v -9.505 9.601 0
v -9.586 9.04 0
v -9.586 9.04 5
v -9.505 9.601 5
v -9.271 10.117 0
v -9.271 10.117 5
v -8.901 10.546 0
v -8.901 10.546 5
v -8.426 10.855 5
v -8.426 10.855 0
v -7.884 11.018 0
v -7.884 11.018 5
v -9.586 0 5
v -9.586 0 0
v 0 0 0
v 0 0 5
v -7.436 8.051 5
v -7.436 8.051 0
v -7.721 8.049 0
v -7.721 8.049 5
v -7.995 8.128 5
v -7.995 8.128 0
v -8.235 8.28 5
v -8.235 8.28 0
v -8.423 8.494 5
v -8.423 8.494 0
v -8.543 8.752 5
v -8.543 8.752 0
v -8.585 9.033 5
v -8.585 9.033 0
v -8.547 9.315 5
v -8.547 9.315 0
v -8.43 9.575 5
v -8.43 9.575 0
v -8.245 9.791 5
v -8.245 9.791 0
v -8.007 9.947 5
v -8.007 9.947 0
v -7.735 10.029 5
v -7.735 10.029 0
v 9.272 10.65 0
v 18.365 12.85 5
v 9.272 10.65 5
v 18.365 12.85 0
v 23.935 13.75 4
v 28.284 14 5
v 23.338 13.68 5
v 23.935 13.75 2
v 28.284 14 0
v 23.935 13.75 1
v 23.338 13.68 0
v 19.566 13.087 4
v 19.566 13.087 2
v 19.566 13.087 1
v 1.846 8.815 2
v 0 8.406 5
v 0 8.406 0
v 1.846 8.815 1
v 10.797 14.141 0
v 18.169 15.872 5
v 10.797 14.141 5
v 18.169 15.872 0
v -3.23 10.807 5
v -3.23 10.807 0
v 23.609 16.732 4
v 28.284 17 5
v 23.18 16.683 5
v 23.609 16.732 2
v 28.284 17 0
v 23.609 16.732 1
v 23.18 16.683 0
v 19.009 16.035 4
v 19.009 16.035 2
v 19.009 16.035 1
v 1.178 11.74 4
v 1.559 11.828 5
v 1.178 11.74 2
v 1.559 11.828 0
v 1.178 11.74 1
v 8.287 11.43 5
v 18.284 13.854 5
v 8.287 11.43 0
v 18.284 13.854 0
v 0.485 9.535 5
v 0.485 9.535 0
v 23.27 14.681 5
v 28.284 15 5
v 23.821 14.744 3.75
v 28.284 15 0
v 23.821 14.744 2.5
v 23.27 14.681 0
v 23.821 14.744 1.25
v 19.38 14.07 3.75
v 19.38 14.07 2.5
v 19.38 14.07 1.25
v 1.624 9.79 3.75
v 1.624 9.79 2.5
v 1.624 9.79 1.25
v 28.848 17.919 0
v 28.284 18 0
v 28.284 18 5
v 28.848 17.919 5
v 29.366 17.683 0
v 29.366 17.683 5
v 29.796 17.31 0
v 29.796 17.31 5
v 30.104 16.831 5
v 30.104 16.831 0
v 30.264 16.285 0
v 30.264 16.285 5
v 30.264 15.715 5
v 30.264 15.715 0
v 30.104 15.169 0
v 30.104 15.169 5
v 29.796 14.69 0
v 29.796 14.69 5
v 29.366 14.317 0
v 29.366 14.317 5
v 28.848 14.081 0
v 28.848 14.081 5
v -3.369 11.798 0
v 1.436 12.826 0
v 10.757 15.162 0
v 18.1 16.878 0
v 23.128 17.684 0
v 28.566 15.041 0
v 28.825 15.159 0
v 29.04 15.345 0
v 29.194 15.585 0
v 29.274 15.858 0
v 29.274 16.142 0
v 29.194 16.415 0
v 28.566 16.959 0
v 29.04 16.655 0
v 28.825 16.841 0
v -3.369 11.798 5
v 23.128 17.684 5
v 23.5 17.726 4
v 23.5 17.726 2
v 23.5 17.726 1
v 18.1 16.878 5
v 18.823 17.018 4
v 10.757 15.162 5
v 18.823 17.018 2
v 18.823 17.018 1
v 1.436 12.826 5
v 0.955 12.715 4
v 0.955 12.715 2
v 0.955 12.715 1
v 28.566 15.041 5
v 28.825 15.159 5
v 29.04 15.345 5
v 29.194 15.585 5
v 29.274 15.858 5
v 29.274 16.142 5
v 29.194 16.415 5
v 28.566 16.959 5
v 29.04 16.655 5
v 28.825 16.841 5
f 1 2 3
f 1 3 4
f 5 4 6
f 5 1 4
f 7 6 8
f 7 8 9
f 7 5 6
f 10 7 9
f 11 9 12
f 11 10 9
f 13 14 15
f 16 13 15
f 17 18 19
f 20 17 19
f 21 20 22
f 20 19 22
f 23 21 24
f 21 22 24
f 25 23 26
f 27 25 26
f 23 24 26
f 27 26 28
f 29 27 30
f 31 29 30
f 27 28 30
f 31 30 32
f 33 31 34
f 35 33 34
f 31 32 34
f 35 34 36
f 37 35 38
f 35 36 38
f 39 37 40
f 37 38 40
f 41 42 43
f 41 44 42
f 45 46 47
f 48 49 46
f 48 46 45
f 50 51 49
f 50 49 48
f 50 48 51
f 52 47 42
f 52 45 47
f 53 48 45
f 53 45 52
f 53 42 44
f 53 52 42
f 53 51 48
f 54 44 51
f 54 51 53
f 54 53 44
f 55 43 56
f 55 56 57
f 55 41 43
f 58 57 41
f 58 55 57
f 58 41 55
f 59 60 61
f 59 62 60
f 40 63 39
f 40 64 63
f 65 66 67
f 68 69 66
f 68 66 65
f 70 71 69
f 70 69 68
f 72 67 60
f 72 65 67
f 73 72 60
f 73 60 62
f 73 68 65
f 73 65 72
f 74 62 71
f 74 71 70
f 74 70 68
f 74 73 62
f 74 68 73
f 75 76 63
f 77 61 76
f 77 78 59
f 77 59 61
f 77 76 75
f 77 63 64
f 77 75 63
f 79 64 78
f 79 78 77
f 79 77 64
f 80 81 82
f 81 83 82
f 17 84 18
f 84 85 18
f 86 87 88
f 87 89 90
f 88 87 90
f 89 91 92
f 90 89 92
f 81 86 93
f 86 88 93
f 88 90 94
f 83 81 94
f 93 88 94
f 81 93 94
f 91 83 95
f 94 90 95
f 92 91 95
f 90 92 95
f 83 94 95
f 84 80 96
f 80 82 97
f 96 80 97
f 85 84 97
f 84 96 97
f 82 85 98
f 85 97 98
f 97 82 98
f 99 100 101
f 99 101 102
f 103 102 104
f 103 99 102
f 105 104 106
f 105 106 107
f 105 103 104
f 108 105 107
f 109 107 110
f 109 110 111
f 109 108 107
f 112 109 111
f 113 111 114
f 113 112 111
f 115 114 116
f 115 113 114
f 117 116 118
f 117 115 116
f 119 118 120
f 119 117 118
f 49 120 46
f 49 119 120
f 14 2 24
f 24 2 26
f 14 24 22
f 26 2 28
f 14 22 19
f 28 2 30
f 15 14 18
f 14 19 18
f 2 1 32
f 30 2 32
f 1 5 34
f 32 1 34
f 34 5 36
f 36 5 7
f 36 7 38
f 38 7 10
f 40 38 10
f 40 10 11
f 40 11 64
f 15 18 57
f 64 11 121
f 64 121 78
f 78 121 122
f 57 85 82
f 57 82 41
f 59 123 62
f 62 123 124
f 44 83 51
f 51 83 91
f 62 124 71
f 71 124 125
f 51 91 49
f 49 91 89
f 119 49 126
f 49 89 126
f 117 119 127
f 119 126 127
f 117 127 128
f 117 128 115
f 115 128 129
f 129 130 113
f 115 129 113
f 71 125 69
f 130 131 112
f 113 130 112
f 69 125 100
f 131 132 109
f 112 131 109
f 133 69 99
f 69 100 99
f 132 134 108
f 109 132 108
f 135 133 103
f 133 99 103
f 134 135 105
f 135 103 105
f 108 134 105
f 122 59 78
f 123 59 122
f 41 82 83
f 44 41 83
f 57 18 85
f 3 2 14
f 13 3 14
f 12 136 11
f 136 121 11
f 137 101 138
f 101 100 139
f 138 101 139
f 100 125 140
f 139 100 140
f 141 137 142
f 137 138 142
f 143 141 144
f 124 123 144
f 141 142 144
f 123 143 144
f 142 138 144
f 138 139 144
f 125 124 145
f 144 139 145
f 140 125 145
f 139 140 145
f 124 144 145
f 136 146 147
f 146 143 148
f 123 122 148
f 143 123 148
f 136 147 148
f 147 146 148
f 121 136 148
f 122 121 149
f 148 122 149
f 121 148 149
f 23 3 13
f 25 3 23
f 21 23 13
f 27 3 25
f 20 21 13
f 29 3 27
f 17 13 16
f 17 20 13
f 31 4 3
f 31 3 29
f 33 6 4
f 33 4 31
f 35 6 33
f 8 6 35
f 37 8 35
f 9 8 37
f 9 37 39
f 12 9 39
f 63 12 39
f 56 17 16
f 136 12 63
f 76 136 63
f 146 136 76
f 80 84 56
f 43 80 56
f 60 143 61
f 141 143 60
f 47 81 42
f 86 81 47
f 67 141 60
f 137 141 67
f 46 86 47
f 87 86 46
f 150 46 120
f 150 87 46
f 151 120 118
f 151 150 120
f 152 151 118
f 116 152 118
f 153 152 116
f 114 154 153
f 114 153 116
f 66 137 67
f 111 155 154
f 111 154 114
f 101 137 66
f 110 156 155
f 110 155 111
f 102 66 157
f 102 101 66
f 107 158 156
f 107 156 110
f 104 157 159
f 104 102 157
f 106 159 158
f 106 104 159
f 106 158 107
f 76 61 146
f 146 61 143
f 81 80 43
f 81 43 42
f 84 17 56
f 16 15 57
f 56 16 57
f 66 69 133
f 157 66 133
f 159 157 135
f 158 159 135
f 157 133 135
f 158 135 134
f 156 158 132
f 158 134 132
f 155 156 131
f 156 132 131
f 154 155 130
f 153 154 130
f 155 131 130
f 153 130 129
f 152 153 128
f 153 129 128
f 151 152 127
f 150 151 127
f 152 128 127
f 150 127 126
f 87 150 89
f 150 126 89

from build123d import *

# Parameters (mm, degrees)
BOSS_EXTRUDE1_DEPTH = 5
BOSS_EXTRUDE2_DEPTH = 5


with BuildPart() as part:
    # Sketch1 → Boss-Extrude1 (new body)
    with BuildSketch(Plane.XY):
        with BuildLine():
            add(Edge.make_bspline(
                [(28.284271497, 14), (26.832248759, 13.999999819), (23.942322546, 13.818389143), (18.107055454, 12.906300241), (10.807723253, 11.057558996), (1.886546527, 8.727754338), (-4.221907722, 7.524457078), (-7.287402613, 7.062387403)],
                knots=[0, 0, 0, 0, 0.085588552, 0.171177105, 0.342354209, 0.513531314, 0.684708419, 0.684708419, 0.684708419, 0.684708419], degree=3))
            ThreePointArc((-7.287402613, 7.062387403), (-9.563159868, 8.741949524), (-7.883597747, 11.017706779))
            add(Edge.make_bspline(
                [(28.284270998, 18), (26.686938926, 17.999999801), (23.476167151, 17.798108662), (17.246191739, 16.817667516), (9.748762966, 14.913893444), (0.95977161, 12.622104017), (-4.916957068, 11.464875912), (-7.883597747, 11.017706779)],
                knots=[0, 0, 0, 0, 0.085588552, 0.171177105, 0.342354209, 0.513531314, 0.684708419, 0.684708419, 0.684708419, 0.684708419], degree=3))
            ThreePointArc((28.284270998, 18), (30.284271247, 16.00000025), (28.284271497, 14))
        make_face()
        with BuildLine():
            ThreePointArc((28.284271123, 17), (29.284271247, 16.000000125), (28.284271372, 15))
            add(Edge.make_bspline(
                [(28.284271372, 15), (25.299991519, 14.999999628), (19.368041064, 14.256121216), (10.541251955, 12.021782806), (1.655347435, 9.701301701), (-4.395670061, 8.509561786), (-7.436451397, 8.051217247)],
                knots=[0, 0, 0, 0, 0.171177105, 0.342354209, 0.513531314, 0.684708419, 0.684708419, 0.684708419, 0.684708419], degree=3))
            ThreePointArc((-7.436451397, 8.051217247), (-8.574330024, 8.890998308), (-7.734548963, 10.028876935))
            add(Edge.make_bspline(
                [(28.284271123, 17), (26.723266395, 16.999999805), (23.592705995, 16.803178782), (17.46140767, 15.839825697), (10.013503037, 13.949809832), (1.19146534, 11.648516598), (-4.743194733, 10.479771203), (-7.734548963, 10.028876935)],
                knots=[0, 0, 0, 0, 0.085588552, 0.171177105, 0.342354209, 0.513531314, 0.684708419, 0.684708419, 0.684708419, 0.684708419], degree=3))
        make_face(mode=Mode.SUBTRACT)
    extrude(amount=BOSS_EXTRUDE1_DEPTH)

    # Sketch2 → Boss-Extrude2 (add)
    with BuildSketch(Plane.XY):
        with BuildLine():
            Line((-9.58550018, 0), (0, 0))
            Line((0, 0), (0, 8.405502806))
            add(Edge.make_bspline(
                [(0, 8.405502806), (-2.412231278, 7.886824896), (-4.846244229, 7.430349282), (-7.287402613, 7.062387403)],
                knots=[0.548394238, 0.548394238, 0.548394238, 0.548394238, 0.684708419, 0.684708419, 0.684708419, 0.684708419], degree=3))
            ThreePointArc((-7.287402613, 7.062387403), (-8.890070007, 7.524099346), (-9.58550018, 9.040047091))
            Line((-9.58550018, 9.040047091), (-9.58550018, 0))
        make_face()
    extrude(amount=BOSS_EXTRUDE2_DEPTH)


solid = part.part
